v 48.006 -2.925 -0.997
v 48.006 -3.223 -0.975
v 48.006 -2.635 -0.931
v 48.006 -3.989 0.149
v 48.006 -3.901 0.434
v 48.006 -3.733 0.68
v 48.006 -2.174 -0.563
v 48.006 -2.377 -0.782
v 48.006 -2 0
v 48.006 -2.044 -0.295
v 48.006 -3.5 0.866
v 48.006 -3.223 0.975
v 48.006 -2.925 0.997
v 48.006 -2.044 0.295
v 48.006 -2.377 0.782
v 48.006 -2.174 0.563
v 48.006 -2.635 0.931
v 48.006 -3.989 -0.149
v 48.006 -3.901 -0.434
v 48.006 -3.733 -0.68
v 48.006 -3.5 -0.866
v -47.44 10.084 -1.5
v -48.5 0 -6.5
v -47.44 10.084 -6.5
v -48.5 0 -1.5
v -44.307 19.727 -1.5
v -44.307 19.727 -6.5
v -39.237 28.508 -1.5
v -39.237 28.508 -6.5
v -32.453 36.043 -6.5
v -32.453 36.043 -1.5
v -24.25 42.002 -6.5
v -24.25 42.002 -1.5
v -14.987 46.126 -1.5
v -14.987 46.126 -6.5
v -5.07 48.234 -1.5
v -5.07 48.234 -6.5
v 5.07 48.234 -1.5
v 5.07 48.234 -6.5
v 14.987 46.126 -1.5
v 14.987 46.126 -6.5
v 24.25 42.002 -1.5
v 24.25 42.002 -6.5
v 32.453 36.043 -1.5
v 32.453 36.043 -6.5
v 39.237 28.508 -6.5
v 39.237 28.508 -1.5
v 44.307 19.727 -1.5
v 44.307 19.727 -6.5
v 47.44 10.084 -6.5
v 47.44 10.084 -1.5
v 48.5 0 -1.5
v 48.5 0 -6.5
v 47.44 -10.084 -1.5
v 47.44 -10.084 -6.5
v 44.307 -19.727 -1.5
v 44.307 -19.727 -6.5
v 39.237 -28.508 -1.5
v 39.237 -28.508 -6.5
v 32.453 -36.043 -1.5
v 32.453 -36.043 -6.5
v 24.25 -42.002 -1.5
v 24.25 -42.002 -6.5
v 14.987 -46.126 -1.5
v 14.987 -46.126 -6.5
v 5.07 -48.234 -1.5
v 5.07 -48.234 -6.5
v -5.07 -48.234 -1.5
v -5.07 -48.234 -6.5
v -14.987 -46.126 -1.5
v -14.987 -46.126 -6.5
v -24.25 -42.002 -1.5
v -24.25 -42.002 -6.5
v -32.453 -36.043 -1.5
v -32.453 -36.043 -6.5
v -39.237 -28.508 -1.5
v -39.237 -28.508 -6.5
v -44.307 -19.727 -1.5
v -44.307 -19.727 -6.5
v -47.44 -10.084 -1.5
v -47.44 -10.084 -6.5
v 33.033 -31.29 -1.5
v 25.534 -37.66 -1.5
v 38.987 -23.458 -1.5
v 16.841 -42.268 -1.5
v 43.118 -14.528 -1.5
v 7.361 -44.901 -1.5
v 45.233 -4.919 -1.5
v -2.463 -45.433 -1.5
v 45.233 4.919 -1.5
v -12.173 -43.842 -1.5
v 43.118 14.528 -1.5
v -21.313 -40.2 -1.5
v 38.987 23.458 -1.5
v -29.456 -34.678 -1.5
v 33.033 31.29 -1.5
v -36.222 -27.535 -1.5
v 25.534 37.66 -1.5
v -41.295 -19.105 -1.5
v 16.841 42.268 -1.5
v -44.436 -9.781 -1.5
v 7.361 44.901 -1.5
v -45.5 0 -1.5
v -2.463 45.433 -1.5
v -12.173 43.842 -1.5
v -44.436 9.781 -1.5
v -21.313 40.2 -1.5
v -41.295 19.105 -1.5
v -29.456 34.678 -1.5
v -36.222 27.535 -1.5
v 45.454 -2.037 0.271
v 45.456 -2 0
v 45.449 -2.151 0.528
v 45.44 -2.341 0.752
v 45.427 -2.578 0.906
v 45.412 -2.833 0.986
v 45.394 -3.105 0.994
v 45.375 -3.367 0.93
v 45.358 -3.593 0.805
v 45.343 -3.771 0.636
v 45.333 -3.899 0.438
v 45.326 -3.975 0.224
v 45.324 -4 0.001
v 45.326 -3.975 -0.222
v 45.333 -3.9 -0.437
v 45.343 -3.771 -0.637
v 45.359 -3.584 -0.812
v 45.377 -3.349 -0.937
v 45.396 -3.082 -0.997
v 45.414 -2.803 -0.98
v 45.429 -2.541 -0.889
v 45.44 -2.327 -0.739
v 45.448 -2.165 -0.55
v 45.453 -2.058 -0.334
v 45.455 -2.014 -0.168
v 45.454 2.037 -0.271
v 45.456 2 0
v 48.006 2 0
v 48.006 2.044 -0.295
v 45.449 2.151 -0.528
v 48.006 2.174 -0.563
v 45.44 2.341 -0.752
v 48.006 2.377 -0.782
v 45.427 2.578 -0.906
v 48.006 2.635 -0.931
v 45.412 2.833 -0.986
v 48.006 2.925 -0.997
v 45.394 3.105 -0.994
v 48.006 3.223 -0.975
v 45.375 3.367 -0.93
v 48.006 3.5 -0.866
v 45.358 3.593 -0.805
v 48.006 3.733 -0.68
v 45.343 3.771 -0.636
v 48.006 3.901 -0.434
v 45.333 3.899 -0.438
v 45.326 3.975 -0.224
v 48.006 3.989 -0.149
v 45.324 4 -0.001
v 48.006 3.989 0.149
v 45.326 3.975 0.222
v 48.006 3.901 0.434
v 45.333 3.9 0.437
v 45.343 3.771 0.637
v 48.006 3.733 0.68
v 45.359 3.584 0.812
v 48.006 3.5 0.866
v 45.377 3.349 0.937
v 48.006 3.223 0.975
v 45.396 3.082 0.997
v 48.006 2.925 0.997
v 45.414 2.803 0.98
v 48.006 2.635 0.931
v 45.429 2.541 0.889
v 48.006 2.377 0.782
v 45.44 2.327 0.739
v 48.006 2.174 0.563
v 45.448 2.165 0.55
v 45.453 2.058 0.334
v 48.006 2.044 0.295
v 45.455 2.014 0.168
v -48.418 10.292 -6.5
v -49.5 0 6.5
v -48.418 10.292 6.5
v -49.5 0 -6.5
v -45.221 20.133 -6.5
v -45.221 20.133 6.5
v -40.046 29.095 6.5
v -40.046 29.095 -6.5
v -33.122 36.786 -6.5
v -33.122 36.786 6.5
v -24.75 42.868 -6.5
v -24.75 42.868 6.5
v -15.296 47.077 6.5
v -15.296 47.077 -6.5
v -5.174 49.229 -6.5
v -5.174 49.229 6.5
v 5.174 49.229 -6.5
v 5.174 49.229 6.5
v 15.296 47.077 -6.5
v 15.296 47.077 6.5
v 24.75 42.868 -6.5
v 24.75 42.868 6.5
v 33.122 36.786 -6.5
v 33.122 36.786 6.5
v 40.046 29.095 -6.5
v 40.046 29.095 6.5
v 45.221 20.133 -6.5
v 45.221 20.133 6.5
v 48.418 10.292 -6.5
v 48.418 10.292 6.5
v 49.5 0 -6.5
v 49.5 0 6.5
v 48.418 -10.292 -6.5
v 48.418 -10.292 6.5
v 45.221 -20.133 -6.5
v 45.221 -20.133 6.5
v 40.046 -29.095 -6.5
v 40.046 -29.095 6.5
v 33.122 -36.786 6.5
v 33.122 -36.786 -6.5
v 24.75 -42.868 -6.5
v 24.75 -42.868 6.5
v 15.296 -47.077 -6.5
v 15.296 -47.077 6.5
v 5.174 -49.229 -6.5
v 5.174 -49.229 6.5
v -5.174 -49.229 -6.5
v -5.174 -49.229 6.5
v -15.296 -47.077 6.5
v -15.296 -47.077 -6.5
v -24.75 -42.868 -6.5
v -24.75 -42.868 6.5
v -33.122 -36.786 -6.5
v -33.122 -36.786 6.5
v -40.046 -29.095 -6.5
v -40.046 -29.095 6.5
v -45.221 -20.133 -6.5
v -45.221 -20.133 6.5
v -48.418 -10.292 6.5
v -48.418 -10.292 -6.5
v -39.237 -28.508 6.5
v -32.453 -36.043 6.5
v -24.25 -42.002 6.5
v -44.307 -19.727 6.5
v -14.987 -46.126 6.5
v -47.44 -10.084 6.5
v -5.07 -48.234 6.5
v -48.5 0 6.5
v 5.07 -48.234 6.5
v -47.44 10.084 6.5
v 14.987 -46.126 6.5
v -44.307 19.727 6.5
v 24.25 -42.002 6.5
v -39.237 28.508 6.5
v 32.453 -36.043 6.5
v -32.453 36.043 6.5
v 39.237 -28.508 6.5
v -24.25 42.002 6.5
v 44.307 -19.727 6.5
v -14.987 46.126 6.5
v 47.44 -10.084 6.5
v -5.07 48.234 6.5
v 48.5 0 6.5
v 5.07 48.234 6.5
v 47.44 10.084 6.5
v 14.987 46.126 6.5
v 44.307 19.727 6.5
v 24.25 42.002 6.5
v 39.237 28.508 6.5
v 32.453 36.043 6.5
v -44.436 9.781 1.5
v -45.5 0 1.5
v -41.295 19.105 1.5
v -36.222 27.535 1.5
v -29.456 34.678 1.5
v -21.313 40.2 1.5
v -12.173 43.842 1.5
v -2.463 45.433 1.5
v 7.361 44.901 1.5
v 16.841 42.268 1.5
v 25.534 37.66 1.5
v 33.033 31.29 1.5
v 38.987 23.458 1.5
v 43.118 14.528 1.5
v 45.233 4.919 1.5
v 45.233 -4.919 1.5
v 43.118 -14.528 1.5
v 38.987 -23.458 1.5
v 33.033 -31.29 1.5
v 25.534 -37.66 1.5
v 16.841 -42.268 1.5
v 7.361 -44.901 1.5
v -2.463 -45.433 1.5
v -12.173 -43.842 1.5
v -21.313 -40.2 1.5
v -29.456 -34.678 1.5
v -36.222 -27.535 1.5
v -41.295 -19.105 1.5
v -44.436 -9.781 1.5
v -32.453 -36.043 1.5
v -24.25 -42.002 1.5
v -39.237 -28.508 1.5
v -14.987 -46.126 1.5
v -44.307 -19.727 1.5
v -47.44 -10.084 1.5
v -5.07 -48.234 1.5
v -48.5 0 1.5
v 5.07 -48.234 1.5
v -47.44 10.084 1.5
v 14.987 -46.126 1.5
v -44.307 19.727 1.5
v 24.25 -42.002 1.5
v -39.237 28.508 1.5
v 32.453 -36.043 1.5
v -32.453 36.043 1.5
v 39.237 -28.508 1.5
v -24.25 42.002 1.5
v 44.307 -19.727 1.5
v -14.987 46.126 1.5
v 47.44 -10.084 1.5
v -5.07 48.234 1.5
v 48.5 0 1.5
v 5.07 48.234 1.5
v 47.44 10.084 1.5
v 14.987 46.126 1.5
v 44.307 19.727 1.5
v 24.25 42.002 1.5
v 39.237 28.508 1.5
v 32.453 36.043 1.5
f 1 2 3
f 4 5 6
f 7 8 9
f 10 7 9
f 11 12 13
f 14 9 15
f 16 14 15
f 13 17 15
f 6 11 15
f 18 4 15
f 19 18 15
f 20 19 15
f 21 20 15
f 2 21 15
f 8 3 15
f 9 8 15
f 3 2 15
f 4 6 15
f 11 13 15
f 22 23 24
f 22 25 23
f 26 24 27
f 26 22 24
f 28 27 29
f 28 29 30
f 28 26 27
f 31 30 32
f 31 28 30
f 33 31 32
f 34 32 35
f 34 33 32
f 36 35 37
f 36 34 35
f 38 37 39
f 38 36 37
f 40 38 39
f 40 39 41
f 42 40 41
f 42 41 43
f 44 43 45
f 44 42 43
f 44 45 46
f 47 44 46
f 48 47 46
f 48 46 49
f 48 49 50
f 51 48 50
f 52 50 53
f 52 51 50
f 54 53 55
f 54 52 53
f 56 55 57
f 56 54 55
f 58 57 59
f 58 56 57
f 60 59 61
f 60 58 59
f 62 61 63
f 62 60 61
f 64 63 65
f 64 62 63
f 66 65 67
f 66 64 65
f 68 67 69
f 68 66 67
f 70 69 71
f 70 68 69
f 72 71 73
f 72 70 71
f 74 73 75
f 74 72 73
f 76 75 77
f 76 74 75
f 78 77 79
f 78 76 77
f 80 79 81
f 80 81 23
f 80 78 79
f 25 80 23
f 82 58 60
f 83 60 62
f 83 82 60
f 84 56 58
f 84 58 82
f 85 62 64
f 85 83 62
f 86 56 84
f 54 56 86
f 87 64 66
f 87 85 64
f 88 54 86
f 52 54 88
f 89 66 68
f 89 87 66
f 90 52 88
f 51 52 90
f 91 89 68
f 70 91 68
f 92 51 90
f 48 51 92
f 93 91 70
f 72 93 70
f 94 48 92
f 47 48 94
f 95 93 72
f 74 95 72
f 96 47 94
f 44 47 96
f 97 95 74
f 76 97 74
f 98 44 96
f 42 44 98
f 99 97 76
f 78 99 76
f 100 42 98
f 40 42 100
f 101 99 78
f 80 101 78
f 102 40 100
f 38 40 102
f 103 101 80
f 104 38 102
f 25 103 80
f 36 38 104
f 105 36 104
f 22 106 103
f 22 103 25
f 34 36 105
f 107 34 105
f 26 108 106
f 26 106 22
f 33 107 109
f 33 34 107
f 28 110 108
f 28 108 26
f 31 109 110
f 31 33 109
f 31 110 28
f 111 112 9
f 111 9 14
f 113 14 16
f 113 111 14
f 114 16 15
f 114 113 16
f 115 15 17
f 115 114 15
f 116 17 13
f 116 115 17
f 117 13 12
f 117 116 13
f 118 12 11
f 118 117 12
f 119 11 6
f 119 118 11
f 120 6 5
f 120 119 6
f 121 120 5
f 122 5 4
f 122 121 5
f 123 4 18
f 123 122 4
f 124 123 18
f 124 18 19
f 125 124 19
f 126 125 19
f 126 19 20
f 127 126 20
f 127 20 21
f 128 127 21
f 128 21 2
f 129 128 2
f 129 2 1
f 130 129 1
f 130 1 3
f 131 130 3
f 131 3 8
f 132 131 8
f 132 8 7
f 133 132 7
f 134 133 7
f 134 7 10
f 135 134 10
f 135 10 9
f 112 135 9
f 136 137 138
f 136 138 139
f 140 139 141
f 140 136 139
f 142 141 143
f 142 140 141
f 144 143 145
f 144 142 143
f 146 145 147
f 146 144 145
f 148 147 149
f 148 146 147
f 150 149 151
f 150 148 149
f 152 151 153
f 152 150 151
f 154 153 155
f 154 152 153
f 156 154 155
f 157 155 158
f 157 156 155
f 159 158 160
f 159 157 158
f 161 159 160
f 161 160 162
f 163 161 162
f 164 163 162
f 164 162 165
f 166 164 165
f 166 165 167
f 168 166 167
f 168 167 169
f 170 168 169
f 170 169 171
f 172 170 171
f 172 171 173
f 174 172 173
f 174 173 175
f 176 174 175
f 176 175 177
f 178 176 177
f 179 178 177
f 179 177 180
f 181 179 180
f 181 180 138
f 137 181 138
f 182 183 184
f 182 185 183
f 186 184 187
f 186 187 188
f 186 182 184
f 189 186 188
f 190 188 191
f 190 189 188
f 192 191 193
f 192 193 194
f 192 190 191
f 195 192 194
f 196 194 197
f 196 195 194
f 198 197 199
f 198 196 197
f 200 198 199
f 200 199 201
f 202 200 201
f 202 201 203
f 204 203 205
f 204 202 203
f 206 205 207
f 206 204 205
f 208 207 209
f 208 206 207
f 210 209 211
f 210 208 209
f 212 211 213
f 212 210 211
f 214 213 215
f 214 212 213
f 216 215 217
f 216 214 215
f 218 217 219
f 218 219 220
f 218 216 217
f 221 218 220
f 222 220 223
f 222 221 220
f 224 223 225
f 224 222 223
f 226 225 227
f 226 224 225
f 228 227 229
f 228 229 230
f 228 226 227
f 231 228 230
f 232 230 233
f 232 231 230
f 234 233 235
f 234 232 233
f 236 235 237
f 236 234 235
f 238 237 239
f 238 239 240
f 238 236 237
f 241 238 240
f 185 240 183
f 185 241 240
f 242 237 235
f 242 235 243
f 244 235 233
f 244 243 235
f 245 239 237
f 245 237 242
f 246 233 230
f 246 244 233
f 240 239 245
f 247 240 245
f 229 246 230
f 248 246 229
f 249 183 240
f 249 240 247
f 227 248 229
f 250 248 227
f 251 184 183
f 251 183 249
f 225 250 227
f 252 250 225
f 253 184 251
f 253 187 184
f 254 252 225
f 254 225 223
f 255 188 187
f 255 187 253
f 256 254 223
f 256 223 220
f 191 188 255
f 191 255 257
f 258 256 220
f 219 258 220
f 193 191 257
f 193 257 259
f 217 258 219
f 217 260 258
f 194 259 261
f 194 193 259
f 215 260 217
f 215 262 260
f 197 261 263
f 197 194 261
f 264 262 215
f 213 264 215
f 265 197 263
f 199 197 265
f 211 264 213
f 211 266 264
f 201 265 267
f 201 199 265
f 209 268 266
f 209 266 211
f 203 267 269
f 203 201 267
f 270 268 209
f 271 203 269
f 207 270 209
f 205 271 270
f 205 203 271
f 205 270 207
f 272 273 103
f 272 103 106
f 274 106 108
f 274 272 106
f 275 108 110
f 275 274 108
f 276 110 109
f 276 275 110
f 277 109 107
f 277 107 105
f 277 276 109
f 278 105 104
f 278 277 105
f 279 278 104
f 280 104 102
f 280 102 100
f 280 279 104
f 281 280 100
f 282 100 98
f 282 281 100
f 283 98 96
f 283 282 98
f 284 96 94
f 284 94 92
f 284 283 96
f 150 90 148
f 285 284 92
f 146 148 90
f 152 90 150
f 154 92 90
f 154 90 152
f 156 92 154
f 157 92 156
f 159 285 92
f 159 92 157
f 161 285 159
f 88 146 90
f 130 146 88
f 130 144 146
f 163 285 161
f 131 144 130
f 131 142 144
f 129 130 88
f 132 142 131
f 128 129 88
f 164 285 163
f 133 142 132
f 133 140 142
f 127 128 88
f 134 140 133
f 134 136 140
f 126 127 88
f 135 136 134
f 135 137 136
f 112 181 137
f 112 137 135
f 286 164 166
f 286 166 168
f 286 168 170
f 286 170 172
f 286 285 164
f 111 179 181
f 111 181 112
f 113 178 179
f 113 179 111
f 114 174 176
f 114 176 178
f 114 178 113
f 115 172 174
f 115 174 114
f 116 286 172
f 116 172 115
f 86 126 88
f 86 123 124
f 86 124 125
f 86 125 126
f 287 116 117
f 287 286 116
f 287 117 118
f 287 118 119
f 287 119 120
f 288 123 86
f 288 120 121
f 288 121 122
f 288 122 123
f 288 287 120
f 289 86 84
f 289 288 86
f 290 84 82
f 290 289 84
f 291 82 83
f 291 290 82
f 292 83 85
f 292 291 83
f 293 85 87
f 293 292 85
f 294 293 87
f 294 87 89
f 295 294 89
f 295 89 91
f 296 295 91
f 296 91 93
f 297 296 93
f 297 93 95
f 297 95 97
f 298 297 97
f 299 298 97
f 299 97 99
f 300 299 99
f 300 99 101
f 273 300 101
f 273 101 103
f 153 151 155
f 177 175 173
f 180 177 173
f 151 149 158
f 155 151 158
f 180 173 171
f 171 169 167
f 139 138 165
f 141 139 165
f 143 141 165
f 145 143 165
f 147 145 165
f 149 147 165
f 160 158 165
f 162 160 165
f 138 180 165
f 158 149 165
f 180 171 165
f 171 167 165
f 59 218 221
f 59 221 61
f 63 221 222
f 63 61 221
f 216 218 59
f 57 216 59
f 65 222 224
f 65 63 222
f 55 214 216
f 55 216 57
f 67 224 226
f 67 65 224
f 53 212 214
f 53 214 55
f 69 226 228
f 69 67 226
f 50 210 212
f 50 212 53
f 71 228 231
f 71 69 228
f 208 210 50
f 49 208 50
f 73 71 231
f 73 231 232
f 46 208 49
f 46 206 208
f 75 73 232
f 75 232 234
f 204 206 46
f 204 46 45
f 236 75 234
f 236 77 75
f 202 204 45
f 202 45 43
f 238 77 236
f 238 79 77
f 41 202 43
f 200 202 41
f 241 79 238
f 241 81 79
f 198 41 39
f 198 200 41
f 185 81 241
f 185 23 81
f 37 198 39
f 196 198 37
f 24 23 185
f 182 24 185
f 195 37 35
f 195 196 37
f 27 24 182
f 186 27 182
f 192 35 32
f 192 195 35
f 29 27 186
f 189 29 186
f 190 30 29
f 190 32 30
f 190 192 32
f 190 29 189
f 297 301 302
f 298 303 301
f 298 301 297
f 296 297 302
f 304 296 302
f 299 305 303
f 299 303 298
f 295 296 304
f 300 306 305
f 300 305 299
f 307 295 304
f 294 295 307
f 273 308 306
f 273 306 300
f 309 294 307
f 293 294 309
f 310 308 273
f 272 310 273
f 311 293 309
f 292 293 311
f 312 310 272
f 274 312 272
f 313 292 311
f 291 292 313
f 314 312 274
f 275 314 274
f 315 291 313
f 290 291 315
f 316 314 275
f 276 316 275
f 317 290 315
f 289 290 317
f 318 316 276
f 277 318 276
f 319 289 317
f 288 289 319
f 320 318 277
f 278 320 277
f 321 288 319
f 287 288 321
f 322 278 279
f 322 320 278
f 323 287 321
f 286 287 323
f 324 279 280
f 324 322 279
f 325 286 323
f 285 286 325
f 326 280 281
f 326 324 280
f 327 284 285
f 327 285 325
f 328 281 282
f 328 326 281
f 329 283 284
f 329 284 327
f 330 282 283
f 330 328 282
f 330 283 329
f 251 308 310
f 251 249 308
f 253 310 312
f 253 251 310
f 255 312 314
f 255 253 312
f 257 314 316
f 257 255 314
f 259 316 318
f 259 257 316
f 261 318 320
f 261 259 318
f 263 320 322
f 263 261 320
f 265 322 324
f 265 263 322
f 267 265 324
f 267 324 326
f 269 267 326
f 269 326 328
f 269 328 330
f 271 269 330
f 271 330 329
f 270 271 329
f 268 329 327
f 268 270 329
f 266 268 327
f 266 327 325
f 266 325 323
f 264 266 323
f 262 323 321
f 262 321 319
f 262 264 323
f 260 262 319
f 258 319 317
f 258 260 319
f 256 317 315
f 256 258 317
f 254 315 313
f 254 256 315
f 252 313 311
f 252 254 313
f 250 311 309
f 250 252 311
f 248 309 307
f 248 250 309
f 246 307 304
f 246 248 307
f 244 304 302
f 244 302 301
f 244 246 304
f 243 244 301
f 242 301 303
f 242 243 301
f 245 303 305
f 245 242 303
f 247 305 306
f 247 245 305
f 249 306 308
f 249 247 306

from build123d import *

# Parameters (mm, degrees)
F2_R     = 1
F3_DEPTH = 48.006


# Not quite as in the source:
# - the program builds the solid bodies; features that only make, move or delete a surface that nothing else refers to are left out


with BuildPart() as f1:
    # F0 (on Front) → F1 (revolve)
    with BuildSketch(Plane.XZ):
        Polygon((-48.5, 6.5), (-49.5, 6.5), (-49.5, -6.5), (-48.5, -6.5), (-48.5, -1.5), (-45.5, -1.5), (-45.5, 0), (-45.5, 1.5), (-48.5, 1.5), align=None)
    revolve(axis=Axis((0, 0, -3.8321989188), (0, 0, -1)))

    # F2 (on Right) → F3 (cut)
    with BuildSketch(Plane.YZ):
        with Locations((-3, 0)):
            Circle(F2_R)
        with BuildLine():
            ThreePointArc((4, 0), (3, 1), (2, 0))
            ThreePointArc((2, 0), (3, -1), (4, 0))
        make_face()
    extrude(amount=F3_DEPTH, mode=Mode.SUBTRACT)


solid = f1.part
